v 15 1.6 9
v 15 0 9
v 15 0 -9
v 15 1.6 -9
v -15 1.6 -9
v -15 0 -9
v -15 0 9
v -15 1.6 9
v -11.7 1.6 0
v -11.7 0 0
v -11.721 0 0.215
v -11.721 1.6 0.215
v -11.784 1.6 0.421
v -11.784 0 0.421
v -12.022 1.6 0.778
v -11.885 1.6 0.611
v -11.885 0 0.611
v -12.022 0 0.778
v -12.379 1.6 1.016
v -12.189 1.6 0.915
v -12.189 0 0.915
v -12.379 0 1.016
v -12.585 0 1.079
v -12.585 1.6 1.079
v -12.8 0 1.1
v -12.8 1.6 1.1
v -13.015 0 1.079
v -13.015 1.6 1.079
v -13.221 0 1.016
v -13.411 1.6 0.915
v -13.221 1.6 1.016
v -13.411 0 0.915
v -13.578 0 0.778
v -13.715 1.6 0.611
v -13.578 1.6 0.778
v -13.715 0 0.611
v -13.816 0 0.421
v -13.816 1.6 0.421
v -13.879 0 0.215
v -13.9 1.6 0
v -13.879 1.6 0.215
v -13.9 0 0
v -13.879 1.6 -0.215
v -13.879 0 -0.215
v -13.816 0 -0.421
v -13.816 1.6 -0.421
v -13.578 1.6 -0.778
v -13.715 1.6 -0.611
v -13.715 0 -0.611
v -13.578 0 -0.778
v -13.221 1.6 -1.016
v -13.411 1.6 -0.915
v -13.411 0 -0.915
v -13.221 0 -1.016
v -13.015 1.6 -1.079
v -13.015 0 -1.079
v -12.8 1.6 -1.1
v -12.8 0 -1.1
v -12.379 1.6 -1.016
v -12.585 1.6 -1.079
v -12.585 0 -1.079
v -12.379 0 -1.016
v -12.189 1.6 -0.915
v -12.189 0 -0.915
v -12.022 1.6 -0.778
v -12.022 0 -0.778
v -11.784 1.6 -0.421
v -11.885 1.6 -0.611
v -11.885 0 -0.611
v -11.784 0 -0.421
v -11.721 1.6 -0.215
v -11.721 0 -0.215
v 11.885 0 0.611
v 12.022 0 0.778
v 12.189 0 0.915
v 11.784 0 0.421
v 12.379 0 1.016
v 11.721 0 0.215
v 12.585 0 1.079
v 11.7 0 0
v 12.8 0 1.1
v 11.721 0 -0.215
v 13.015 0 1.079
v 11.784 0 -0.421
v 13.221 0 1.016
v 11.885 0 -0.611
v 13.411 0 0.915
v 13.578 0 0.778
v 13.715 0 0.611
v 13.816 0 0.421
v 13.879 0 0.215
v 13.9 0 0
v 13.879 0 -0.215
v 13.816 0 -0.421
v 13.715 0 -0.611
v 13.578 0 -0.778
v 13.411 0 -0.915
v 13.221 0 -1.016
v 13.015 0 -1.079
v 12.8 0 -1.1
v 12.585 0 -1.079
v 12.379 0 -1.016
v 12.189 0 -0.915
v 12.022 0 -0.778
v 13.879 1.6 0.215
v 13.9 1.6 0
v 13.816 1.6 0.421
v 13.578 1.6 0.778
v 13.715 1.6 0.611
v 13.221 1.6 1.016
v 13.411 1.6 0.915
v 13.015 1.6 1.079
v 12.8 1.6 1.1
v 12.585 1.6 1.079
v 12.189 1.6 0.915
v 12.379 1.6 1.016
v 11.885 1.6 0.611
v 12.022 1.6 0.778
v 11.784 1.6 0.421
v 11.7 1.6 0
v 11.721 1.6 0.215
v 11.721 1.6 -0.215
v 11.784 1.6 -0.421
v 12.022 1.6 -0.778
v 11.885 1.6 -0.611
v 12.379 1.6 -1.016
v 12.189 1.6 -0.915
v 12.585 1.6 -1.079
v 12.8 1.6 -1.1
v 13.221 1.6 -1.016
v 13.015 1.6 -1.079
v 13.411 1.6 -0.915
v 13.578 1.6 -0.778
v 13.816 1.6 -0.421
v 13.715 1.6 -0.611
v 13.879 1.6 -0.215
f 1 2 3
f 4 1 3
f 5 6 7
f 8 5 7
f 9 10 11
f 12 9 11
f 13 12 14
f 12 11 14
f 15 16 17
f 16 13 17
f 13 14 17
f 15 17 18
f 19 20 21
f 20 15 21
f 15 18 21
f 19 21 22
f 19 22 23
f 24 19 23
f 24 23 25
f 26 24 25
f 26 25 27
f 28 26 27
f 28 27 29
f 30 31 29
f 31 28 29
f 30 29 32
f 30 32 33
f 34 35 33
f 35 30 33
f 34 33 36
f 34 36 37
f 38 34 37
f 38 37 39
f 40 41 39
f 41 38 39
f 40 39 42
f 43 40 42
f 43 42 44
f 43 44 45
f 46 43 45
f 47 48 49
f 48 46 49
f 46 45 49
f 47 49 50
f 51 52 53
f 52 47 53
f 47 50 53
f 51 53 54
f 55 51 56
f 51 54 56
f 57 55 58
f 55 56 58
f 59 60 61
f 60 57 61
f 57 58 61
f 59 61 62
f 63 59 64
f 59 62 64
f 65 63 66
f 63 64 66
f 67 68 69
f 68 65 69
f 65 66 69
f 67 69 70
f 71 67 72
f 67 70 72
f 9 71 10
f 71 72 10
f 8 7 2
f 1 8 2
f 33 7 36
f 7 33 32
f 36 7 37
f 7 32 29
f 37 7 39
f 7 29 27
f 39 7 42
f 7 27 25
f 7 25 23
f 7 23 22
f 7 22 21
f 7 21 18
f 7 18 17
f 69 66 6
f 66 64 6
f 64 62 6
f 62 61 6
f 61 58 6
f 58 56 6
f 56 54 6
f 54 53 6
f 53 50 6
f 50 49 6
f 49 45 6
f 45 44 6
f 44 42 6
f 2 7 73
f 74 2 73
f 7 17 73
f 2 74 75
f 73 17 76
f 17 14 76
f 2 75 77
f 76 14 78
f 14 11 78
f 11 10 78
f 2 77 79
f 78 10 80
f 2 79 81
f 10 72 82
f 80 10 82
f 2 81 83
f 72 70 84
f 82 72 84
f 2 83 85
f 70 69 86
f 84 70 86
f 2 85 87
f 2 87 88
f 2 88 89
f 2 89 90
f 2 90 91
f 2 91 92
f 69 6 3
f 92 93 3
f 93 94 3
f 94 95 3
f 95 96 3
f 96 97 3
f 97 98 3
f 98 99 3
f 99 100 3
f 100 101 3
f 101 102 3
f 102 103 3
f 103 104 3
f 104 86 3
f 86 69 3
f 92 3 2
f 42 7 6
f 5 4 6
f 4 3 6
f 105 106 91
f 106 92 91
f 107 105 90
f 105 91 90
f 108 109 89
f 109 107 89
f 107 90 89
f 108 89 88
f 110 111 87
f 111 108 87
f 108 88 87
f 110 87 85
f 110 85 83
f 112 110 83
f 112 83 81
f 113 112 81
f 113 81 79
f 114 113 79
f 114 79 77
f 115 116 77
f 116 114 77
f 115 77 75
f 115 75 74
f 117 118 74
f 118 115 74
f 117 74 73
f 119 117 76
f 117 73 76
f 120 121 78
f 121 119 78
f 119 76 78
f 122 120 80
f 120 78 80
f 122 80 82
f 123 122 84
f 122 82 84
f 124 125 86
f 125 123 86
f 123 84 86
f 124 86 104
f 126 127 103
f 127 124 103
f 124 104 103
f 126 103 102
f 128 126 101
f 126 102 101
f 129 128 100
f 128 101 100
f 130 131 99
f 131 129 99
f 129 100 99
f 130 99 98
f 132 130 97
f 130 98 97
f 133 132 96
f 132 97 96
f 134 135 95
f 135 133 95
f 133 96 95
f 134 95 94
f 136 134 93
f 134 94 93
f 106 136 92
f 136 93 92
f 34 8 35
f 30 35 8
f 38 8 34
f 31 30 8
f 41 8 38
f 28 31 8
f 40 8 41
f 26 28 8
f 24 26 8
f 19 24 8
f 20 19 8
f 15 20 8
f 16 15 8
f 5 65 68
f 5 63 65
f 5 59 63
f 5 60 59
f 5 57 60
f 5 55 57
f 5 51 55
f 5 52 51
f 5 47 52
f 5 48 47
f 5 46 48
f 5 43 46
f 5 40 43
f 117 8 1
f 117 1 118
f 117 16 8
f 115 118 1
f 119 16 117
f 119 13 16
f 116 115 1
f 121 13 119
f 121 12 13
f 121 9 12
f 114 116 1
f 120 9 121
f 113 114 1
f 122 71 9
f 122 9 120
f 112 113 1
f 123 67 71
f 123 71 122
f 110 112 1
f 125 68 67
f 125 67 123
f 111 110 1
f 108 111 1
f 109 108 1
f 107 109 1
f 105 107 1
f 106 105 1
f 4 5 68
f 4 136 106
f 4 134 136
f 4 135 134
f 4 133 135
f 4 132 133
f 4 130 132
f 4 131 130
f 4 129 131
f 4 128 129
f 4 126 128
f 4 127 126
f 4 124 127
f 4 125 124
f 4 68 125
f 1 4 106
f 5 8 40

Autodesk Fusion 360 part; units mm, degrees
sketch "Sketch1" plane through (0, 0, 0) normal (0, 1, 0) x (1, 0, 0)
  line L0 (-15, -9) -> (15, -9)
  line L1 (15, -9) -> (15, 9)
  line L2 (15, 9) -> (-15, 9)
  line L3 (-15, 9) -> (-15, -9)
  line L4 (-15, -9) -> (15, 9) construction
  line L5 (15, -9) -> (-15, 9) construction
  circle A0 centre (12.8, 0) radius 1.1
  circle A1 centre (-12.8, 0) radius 1.1
  dimension "d1" = 30
  dimension "d2" = 18
  dimension "d3" = 2.2
  dimension "d4" = 2.2
  dimension "d5" = 2.2
  dimension "d6" = 2.2
extrude "Extrude1" add sketch "Sketch1" along normal blind 1.6
